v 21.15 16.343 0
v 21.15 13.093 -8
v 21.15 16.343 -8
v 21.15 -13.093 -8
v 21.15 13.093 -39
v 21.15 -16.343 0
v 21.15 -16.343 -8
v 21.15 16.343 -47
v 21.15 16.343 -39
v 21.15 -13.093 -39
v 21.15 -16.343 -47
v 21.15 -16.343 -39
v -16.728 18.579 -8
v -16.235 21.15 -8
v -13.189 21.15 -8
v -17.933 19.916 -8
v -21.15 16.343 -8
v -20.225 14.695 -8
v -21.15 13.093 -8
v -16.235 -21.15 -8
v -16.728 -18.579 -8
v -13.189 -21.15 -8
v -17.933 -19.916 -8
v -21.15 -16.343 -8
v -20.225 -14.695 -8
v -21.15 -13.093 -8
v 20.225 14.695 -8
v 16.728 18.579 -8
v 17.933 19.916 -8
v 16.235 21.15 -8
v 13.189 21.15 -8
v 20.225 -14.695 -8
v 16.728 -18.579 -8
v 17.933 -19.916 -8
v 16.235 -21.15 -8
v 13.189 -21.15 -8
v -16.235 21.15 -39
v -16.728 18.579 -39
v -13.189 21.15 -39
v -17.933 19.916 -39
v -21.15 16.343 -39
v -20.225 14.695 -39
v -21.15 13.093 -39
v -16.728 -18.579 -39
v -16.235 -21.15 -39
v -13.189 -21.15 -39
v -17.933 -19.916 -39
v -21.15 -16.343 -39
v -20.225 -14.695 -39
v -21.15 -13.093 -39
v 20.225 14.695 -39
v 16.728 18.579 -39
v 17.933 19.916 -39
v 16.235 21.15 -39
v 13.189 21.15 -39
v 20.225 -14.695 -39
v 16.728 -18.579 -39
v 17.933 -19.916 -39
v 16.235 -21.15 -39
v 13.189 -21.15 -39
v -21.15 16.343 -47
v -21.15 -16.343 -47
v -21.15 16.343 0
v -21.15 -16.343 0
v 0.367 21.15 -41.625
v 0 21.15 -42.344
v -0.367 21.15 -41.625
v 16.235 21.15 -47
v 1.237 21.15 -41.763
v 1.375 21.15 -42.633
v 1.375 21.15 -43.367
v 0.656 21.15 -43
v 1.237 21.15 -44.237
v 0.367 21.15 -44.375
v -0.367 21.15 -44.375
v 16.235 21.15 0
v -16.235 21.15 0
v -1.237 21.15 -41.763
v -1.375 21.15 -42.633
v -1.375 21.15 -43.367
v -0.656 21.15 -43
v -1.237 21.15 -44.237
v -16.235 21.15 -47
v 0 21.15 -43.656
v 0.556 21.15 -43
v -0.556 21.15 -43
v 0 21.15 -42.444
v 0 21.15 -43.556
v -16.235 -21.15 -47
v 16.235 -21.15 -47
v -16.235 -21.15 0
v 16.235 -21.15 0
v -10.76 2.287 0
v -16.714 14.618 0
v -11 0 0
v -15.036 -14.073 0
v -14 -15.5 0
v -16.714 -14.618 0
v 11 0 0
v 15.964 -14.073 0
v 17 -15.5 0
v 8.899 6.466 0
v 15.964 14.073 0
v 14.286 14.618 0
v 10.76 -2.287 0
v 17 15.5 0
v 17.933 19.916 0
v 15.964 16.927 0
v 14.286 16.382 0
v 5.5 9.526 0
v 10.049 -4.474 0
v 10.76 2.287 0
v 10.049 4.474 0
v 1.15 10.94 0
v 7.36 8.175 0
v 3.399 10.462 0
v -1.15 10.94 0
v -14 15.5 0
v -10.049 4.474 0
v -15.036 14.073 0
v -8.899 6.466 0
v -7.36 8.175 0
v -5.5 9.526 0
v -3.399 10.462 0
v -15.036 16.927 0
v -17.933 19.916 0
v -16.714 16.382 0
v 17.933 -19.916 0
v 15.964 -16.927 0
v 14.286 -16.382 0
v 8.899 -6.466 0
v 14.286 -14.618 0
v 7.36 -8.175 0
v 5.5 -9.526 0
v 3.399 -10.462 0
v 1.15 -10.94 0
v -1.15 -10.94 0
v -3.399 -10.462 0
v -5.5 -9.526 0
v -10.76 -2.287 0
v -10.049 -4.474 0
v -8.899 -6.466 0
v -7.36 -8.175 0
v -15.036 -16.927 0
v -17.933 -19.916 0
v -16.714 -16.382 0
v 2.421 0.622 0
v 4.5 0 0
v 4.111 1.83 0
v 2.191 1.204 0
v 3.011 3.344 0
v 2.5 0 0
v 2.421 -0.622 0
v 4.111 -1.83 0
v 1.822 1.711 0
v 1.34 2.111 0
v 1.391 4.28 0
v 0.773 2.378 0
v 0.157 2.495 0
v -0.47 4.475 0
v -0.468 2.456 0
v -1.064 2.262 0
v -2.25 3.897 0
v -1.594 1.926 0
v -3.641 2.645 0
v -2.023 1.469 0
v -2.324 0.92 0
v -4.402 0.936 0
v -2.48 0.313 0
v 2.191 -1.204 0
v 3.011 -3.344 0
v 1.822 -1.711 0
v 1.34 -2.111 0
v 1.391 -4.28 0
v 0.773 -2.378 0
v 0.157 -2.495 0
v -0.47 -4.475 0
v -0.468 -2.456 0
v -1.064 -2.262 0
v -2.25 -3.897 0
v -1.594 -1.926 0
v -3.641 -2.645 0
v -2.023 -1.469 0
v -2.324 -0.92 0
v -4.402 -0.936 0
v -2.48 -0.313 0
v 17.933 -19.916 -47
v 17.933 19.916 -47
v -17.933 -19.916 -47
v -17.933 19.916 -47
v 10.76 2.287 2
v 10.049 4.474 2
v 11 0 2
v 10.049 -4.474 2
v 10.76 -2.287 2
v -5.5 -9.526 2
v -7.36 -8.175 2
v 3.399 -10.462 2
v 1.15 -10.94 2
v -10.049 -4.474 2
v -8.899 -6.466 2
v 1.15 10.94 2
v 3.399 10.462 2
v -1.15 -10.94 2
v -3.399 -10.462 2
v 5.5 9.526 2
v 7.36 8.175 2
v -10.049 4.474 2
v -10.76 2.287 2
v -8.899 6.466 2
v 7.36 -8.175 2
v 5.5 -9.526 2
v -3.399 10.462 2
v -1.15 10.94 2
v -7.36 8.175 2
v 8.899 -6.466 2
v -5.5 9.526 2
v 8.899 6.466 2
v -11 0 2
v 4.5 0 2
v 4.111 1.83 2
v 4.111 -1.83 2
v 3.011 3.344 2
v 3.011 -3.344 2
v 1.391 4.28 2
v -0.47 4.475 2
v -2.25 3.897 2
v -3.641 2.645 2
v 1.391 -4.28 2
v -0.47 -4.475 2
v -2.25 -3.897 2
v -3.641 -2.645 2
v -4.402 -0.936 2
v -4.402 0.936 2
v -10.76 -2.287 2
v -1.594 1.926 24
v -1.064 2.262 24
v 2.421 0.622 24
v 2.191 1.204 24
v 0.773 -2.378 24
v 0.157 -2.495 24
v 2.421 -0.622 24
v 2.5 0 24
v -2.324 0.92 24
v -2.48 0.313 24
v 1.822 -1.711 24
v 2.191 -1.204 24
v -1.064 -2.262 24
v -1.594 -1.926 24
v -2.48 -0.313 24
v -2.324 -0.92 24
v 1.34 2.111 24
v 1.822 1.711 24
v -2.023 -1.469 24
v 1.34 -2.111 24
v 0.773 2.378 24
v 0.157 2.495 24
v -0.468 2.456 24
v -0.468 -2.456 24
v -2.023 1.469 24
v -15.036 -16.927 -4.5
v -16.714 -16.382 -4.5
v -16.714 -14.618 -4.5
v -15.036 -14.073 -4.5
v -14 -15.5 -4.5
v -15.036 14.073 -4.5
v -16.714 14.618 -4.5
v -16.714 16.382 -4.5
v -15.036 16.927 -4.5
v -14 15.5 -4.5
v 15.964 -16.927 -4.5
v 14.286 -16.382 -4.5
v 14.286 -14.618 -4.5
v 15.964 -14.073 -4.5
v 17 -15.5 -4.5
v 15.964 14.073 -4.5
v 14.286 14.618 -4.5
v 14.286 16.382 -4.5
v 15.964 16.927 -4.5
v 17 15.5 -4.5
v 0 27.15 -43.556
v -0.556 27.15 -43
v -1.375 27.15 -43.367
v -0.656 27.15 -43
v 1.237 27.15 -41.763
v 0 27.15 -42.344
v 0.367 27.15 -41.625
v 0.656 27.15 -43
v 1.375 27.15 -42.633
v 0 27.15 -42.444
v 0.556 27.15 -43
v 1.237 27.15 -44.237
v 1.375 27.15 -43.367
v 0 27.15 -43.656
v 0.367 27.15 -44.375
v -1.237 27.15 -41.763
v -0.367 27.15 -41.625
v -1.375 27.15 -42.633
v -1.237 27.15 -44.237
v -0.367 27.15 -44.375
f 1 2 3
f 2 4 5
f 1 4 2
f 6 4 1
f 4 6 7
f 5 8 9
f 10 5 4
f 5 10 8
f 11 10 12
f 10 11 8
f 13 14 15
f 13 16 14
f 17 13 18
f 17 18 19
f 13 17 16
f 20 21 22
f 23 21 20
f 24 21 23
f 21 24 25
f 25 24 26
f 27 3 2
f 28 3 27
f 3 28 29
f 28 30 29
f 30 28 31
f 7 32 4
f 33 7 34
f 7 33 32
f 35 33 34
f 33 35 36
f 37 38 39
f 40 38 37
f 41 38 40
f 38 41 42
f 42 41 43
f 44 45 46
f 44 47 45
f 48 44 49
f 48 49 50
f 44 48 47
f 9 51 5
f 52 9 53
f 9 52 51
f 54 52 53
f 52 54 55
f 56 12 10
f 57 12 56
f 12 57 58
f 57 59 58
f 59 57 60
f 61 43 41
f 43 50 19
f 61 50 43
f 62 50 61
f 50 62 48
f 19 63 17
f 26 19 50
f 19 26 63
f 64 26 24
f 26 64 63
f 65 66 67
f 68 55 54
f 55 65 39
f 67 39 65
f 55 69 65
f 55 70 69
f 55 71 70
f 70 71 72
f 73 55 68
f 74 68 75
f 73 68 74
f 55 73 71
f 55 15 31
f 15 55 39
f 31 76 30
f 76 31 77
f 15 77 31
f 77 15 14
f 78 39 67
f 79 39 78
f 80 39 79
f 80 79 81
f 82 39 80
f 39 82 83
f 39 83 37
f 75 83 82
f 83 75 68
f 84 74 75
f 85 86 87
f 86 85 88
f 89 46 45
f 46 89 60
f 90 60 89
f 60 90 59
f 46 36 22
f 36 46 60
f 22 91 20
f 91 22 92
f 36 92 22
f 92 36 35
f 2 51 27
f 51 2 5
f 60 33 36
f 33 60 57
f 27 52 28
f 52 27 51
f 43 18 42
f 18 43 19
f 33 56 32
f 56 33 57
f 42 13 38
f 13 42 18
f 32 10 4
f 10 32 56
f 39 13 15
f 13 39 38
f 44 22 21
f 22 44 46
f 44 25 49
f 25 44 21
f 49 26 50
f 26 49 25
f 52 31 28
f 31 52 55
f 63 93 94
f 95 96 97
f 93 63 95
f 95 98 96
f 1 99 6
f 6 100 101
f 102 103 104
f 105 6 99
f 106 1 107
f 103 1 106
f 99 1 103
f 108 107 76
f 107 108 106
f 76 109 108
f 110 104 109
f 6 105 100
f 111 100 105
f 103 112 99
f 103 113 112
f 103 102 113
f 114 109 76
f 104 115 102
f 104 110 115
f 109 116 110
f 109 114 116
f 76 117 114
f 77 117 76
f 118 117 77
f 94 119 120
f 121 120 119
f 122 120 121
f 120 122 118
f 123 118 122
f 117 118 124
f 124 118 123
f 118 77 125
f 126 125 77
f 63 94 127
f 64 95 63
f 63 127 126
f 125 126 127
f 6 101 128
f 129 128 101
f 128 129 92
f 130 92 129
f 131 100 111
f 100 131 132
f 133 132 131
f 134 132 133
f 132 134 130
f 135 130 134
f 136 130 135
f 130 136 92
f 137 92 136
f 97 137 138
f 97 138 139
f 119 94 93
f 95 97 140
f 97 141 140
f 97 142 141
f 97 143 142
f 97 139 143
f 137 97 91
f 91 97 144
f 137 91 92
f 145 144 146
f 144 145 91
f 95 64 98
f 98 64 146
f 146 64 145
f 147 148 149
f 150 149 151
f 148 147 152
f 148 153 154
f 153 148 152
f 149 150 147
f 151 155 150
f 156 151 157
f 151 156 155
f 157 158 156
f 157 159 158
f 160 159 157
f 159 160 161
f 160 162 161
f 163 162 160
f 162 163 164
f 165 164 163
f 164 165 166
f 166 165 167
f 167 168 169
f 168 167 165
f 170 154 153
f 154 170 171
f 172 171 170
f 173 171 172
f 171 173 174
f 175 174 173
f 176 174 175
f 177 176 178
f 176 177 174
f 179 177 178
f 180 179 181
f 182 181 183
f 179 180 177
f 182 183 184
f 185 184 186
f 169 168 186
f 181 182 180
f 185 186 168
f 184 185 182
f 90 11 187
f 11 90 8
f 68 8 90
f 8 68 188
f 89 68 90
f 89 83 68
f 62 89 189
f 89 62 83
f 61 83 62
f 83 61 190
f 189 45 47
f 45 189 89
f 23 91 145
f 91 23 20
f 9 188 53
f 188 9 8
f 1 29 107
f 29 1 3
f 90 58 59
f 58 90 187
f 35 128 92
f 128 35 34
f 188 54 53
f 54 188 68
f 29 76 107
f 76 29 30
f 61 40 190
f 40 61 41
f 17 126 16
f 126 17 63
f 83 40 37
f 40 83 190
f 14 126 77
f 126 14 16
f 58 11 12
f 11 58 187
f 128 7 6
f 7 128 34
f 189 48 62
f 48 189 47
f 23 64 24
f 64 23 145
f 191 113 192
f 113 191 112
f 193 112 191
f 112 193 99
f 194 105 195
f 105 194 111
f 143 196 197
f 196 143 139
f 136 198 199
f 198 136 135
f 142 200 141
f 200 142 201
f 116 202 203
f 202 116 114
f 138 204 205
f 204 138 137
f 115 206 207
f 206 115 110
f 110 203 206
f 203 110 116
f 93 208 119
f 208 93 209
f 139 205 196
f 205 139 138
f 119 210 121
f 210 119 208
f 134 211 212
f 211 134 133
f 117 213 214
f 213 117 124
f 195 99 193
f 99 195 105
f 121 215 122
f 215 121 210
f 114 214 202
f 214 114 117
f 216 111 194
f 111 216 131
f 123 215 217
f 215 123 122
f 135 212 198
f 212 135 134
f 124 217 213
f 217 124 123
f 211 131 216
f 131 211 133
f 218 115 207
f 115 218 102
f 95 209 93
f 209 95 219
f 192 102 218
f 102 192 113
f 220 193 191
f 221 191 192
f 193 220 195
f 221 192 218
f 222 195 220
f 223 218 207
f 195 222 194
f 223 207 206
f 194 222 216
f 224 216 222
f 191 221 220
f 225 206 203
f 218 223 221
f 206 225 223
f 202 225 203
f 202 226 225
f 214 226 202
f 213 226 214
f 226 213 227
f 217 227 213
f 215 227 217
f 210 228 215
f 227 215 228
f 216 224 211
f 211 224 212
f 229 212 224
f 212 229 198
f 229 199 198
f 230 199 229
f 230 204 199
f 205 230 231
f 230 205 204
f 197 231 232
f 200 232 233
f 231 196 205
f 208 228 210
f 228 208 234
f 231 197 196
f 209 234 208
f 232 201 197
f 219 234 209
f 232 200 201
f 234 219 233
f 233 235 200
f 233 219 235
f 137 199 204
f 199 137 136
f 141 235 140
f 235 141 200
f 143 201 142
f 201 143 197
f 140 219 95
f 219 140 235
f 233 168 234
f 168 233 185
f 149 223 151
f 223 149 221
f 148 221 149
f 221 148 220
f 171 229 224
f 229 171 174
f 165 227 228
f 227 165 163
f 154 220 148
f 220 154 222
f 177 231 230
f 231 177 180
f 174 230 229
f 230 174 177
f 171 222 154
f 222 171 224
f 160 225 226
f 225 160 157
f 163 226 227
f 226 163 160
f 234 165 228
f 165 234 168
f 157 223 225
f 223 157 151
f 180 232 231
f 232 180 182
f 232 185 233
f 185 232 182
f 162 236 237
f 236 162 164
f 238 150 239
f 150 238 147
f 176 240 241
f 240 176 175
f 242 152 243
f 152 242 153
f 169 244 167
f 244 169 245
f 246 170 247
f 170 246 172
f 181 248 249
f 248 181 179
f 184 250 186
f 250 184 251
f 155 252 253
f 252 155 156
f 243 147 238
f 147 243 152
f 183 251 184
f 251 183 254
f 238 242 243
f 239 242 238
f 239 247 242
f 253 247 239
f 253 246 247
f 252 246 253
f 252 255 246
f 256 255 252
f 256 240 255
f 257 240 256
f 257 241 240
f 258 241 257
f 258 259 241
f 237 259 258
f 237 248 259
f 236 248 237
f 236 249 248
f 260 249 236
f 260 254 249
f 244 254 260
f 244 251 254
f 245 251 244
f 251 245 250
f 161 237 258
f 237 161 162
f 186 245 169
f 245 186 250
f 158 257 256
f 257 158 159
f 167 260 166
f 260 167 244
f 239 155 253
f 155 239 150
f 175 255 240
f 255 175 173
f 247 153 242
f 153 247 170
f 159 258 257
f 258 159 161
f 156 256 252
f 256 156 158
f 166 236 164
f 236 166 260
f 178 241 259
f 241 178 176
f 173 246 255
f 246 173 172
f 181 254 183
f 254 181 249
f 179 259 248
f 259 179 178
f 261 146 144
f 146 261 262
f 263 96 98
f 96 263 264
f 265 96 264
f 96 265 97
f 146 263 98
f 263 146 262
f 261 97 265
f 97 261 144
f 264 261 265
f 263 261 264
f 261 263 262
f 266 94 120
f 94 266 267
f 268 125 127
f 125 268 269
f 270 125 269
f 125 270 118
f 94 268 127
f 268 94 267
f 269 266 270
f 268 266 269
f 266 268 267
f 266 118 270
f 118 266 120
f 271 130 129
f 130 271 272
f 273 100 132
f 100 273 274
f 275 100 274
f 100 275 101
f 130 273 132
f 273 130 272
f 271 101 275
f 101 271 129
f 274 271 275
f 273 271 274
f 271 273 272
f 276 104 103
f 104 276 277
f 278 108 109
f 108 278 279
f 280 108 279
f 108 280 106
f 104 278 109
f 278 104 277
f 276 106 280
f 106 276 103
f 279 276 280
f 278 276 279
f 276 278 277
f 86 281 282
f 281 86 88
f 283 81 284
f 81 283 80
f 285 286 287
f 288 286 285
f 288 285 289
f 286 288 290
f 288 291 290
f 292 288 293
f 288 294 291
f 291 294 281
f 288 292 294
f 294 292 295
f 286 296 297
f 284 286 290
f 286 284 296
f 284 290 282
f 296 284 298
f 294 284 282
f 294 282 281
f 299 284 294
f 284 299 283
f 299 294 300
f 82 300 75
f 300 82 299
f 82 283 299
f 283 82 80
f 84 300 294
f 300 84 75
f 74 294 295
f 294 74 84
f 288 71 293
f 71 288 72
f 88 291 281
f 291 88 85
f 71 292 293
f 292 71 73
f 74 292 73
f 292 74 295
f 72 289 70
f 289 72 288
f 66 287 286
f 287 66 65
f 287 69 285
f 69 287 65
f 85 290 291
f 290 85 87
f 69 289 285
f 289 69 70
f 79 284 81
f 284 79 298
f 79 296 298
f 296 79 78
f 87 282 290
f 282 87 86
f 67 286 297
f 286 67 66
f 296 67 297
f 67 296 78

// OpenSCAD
//
// Mendel90
//
// GNU GPL v2
// nop.head@gmail.com
// hydraraptor.blogspot.com
//
// NEMA stepper motor model
//
// modified by amran amx109@gmail.com

//                       corner  body    boss    boss          shaft
//         side, length, radius, radius, radius, depth, shaft, length, holes
NEMA17  = [42.3, 47,     53.6/2, 25,     11,     2,     5,     24,     31 ];
NEMA17S = [42.3, 34,     53.6/2, 25,     11,     2,     5,     24,     31 ];
NEMA14  = [35.2, 36,     46.4/2, 21,     11,     2,     5,     21,     26 ];
NEMA23  = [56.4, 51.2,   75.7/2, 28.2,   38.1/2, 1.6,   6.35,  24,     47.1 ];

function NEMA_width(motor)       = motor==17 ? NEMA17[0] : motor=="17S"? NEMA17S[0] : motor==14? NEMA14[0] : motor[0];
function NEMA_length(motor)      = motor==17 ? NEMA17[1] : motor=="17S"? NEMA17S[1] : motor==14? NEMA14[1] : motor[1];
function NEMA_radius(motor)      = motor[2];
function NEMA_boss_radius(motor) = motor==17 ? NEMA17[4] : motor=="17S"? NEMA17S[4] : motor==14? NEMA14[4] : motor[4];
function NEMA_boss_height(motor) = motor==17 ? NEMA17[5] : motor=="17S"? NEMA17S[5] : motor==14? NEMA14[5] : motor[5];
function NEMA_shaft_dia(motor)   = motor[6];
function NEMA_shaft_length(motor)= motor==17 ? NEMA17[7] : motor=="17S"? NEMA17S[7] : motor==14? NEMA14[7] : motor[7];
function NEMA_hole_pitch(motor)  = motor==17 ? NEMA17[8] : motor=="17S"? NEMA17S[8] : motor==14? NEMA14[8] : motor[8];
function NEMA_holes(motor)       = [-motor[8]/2, motor[8]/2];

module NEMA(motor) {
    side = NEMA_width(motor);
    length = NEMA_length(motor);
    body_rad = motor[3];
    boss_rad = motor[4];
    boss_height = motor[5];
    shaft_rad = NEMA_shaft_dia(motor) / 2;
    cap = 8;
    //vitamin(str("NEMA", round(motor[0] / 2.54), length * 10, ": NEMA", round(motor[0] / 2.54), " x ", length, "mm stepper motor"));
    union() {
        color("black") render()                                                     // black laminations
            translate([0,0, -length / 2])
                intersection() {
                    cube([side, side, length - cap * 2],center = true);
                    cylinder(r = body_rad, h = 2 * length, center = true);
                }
        color("silver") render() {                                     // aluminium end caps
            difference() {
                union() {
                    intersection() {
                        union() {
                            translate([0,0, -cap / 2])
                                cube([side,side,cap], center = true);
                            translate([0,0, -length + cap / 2])
                                cube([side,side,cap], center = true);
                        }
                        cylinder(r = NEMA_radius(motor), h = 3 * length, center = true);
                    }
                    difference() {
                        cylinder(r = boss_rad, h = boss_height * 2, center = true);                 // raised boss
                        cylinder(r = shaft_rad + 2, h = boss_height * 2 + 1, center = true);
                    }
                    cylinder(r = shaft_rad, h = NEMA_shaft_length(motor) * 2, center = true, $fn=25);  // shaft
                }
                for(x = NEMA_holes(motor))
                    for(y = NEMA_holes(motor))
                        translate([x, y, 0])
                            cylinder(r = 3/2, h = 9, center = true);
            }
        }

        translate([0, side / 2, -length + cap / 2])
            rotate([90, 0, 0])
                for(i = [0:3])
                    rotate([0, 0, 225 + i * 90])
                        color(["red", "blue","green","black"][i]) render()
                            translate([1, 0, 0])
                                cylinder(r = 1.5 / 2, h = 12, center = true);


    }
}

module NEMA_screws(motor, n = 4, screw_length = 8, screw_type = M3_pan_screw) {
    for(a = [0: 90 : 90 * (n - 1)])
        rotate([0, 0, a])
            translate([motor[8]/2, motor[8]/2, 0])
                screw_and_washer(screw_type, screw_length, true);
}

module nema_motor(size)
{
	echo(str("Item: NEMA",size," Stepper Motor"));
	if(size == 17) NEMA(NEMA17);
	if(size == "17S") NEMA(NEMA17S);
	if(size == 14) NEMA(NEMA14);
	if(size == 23) NEMA(NEMA23);
}
nema_motor(17);
